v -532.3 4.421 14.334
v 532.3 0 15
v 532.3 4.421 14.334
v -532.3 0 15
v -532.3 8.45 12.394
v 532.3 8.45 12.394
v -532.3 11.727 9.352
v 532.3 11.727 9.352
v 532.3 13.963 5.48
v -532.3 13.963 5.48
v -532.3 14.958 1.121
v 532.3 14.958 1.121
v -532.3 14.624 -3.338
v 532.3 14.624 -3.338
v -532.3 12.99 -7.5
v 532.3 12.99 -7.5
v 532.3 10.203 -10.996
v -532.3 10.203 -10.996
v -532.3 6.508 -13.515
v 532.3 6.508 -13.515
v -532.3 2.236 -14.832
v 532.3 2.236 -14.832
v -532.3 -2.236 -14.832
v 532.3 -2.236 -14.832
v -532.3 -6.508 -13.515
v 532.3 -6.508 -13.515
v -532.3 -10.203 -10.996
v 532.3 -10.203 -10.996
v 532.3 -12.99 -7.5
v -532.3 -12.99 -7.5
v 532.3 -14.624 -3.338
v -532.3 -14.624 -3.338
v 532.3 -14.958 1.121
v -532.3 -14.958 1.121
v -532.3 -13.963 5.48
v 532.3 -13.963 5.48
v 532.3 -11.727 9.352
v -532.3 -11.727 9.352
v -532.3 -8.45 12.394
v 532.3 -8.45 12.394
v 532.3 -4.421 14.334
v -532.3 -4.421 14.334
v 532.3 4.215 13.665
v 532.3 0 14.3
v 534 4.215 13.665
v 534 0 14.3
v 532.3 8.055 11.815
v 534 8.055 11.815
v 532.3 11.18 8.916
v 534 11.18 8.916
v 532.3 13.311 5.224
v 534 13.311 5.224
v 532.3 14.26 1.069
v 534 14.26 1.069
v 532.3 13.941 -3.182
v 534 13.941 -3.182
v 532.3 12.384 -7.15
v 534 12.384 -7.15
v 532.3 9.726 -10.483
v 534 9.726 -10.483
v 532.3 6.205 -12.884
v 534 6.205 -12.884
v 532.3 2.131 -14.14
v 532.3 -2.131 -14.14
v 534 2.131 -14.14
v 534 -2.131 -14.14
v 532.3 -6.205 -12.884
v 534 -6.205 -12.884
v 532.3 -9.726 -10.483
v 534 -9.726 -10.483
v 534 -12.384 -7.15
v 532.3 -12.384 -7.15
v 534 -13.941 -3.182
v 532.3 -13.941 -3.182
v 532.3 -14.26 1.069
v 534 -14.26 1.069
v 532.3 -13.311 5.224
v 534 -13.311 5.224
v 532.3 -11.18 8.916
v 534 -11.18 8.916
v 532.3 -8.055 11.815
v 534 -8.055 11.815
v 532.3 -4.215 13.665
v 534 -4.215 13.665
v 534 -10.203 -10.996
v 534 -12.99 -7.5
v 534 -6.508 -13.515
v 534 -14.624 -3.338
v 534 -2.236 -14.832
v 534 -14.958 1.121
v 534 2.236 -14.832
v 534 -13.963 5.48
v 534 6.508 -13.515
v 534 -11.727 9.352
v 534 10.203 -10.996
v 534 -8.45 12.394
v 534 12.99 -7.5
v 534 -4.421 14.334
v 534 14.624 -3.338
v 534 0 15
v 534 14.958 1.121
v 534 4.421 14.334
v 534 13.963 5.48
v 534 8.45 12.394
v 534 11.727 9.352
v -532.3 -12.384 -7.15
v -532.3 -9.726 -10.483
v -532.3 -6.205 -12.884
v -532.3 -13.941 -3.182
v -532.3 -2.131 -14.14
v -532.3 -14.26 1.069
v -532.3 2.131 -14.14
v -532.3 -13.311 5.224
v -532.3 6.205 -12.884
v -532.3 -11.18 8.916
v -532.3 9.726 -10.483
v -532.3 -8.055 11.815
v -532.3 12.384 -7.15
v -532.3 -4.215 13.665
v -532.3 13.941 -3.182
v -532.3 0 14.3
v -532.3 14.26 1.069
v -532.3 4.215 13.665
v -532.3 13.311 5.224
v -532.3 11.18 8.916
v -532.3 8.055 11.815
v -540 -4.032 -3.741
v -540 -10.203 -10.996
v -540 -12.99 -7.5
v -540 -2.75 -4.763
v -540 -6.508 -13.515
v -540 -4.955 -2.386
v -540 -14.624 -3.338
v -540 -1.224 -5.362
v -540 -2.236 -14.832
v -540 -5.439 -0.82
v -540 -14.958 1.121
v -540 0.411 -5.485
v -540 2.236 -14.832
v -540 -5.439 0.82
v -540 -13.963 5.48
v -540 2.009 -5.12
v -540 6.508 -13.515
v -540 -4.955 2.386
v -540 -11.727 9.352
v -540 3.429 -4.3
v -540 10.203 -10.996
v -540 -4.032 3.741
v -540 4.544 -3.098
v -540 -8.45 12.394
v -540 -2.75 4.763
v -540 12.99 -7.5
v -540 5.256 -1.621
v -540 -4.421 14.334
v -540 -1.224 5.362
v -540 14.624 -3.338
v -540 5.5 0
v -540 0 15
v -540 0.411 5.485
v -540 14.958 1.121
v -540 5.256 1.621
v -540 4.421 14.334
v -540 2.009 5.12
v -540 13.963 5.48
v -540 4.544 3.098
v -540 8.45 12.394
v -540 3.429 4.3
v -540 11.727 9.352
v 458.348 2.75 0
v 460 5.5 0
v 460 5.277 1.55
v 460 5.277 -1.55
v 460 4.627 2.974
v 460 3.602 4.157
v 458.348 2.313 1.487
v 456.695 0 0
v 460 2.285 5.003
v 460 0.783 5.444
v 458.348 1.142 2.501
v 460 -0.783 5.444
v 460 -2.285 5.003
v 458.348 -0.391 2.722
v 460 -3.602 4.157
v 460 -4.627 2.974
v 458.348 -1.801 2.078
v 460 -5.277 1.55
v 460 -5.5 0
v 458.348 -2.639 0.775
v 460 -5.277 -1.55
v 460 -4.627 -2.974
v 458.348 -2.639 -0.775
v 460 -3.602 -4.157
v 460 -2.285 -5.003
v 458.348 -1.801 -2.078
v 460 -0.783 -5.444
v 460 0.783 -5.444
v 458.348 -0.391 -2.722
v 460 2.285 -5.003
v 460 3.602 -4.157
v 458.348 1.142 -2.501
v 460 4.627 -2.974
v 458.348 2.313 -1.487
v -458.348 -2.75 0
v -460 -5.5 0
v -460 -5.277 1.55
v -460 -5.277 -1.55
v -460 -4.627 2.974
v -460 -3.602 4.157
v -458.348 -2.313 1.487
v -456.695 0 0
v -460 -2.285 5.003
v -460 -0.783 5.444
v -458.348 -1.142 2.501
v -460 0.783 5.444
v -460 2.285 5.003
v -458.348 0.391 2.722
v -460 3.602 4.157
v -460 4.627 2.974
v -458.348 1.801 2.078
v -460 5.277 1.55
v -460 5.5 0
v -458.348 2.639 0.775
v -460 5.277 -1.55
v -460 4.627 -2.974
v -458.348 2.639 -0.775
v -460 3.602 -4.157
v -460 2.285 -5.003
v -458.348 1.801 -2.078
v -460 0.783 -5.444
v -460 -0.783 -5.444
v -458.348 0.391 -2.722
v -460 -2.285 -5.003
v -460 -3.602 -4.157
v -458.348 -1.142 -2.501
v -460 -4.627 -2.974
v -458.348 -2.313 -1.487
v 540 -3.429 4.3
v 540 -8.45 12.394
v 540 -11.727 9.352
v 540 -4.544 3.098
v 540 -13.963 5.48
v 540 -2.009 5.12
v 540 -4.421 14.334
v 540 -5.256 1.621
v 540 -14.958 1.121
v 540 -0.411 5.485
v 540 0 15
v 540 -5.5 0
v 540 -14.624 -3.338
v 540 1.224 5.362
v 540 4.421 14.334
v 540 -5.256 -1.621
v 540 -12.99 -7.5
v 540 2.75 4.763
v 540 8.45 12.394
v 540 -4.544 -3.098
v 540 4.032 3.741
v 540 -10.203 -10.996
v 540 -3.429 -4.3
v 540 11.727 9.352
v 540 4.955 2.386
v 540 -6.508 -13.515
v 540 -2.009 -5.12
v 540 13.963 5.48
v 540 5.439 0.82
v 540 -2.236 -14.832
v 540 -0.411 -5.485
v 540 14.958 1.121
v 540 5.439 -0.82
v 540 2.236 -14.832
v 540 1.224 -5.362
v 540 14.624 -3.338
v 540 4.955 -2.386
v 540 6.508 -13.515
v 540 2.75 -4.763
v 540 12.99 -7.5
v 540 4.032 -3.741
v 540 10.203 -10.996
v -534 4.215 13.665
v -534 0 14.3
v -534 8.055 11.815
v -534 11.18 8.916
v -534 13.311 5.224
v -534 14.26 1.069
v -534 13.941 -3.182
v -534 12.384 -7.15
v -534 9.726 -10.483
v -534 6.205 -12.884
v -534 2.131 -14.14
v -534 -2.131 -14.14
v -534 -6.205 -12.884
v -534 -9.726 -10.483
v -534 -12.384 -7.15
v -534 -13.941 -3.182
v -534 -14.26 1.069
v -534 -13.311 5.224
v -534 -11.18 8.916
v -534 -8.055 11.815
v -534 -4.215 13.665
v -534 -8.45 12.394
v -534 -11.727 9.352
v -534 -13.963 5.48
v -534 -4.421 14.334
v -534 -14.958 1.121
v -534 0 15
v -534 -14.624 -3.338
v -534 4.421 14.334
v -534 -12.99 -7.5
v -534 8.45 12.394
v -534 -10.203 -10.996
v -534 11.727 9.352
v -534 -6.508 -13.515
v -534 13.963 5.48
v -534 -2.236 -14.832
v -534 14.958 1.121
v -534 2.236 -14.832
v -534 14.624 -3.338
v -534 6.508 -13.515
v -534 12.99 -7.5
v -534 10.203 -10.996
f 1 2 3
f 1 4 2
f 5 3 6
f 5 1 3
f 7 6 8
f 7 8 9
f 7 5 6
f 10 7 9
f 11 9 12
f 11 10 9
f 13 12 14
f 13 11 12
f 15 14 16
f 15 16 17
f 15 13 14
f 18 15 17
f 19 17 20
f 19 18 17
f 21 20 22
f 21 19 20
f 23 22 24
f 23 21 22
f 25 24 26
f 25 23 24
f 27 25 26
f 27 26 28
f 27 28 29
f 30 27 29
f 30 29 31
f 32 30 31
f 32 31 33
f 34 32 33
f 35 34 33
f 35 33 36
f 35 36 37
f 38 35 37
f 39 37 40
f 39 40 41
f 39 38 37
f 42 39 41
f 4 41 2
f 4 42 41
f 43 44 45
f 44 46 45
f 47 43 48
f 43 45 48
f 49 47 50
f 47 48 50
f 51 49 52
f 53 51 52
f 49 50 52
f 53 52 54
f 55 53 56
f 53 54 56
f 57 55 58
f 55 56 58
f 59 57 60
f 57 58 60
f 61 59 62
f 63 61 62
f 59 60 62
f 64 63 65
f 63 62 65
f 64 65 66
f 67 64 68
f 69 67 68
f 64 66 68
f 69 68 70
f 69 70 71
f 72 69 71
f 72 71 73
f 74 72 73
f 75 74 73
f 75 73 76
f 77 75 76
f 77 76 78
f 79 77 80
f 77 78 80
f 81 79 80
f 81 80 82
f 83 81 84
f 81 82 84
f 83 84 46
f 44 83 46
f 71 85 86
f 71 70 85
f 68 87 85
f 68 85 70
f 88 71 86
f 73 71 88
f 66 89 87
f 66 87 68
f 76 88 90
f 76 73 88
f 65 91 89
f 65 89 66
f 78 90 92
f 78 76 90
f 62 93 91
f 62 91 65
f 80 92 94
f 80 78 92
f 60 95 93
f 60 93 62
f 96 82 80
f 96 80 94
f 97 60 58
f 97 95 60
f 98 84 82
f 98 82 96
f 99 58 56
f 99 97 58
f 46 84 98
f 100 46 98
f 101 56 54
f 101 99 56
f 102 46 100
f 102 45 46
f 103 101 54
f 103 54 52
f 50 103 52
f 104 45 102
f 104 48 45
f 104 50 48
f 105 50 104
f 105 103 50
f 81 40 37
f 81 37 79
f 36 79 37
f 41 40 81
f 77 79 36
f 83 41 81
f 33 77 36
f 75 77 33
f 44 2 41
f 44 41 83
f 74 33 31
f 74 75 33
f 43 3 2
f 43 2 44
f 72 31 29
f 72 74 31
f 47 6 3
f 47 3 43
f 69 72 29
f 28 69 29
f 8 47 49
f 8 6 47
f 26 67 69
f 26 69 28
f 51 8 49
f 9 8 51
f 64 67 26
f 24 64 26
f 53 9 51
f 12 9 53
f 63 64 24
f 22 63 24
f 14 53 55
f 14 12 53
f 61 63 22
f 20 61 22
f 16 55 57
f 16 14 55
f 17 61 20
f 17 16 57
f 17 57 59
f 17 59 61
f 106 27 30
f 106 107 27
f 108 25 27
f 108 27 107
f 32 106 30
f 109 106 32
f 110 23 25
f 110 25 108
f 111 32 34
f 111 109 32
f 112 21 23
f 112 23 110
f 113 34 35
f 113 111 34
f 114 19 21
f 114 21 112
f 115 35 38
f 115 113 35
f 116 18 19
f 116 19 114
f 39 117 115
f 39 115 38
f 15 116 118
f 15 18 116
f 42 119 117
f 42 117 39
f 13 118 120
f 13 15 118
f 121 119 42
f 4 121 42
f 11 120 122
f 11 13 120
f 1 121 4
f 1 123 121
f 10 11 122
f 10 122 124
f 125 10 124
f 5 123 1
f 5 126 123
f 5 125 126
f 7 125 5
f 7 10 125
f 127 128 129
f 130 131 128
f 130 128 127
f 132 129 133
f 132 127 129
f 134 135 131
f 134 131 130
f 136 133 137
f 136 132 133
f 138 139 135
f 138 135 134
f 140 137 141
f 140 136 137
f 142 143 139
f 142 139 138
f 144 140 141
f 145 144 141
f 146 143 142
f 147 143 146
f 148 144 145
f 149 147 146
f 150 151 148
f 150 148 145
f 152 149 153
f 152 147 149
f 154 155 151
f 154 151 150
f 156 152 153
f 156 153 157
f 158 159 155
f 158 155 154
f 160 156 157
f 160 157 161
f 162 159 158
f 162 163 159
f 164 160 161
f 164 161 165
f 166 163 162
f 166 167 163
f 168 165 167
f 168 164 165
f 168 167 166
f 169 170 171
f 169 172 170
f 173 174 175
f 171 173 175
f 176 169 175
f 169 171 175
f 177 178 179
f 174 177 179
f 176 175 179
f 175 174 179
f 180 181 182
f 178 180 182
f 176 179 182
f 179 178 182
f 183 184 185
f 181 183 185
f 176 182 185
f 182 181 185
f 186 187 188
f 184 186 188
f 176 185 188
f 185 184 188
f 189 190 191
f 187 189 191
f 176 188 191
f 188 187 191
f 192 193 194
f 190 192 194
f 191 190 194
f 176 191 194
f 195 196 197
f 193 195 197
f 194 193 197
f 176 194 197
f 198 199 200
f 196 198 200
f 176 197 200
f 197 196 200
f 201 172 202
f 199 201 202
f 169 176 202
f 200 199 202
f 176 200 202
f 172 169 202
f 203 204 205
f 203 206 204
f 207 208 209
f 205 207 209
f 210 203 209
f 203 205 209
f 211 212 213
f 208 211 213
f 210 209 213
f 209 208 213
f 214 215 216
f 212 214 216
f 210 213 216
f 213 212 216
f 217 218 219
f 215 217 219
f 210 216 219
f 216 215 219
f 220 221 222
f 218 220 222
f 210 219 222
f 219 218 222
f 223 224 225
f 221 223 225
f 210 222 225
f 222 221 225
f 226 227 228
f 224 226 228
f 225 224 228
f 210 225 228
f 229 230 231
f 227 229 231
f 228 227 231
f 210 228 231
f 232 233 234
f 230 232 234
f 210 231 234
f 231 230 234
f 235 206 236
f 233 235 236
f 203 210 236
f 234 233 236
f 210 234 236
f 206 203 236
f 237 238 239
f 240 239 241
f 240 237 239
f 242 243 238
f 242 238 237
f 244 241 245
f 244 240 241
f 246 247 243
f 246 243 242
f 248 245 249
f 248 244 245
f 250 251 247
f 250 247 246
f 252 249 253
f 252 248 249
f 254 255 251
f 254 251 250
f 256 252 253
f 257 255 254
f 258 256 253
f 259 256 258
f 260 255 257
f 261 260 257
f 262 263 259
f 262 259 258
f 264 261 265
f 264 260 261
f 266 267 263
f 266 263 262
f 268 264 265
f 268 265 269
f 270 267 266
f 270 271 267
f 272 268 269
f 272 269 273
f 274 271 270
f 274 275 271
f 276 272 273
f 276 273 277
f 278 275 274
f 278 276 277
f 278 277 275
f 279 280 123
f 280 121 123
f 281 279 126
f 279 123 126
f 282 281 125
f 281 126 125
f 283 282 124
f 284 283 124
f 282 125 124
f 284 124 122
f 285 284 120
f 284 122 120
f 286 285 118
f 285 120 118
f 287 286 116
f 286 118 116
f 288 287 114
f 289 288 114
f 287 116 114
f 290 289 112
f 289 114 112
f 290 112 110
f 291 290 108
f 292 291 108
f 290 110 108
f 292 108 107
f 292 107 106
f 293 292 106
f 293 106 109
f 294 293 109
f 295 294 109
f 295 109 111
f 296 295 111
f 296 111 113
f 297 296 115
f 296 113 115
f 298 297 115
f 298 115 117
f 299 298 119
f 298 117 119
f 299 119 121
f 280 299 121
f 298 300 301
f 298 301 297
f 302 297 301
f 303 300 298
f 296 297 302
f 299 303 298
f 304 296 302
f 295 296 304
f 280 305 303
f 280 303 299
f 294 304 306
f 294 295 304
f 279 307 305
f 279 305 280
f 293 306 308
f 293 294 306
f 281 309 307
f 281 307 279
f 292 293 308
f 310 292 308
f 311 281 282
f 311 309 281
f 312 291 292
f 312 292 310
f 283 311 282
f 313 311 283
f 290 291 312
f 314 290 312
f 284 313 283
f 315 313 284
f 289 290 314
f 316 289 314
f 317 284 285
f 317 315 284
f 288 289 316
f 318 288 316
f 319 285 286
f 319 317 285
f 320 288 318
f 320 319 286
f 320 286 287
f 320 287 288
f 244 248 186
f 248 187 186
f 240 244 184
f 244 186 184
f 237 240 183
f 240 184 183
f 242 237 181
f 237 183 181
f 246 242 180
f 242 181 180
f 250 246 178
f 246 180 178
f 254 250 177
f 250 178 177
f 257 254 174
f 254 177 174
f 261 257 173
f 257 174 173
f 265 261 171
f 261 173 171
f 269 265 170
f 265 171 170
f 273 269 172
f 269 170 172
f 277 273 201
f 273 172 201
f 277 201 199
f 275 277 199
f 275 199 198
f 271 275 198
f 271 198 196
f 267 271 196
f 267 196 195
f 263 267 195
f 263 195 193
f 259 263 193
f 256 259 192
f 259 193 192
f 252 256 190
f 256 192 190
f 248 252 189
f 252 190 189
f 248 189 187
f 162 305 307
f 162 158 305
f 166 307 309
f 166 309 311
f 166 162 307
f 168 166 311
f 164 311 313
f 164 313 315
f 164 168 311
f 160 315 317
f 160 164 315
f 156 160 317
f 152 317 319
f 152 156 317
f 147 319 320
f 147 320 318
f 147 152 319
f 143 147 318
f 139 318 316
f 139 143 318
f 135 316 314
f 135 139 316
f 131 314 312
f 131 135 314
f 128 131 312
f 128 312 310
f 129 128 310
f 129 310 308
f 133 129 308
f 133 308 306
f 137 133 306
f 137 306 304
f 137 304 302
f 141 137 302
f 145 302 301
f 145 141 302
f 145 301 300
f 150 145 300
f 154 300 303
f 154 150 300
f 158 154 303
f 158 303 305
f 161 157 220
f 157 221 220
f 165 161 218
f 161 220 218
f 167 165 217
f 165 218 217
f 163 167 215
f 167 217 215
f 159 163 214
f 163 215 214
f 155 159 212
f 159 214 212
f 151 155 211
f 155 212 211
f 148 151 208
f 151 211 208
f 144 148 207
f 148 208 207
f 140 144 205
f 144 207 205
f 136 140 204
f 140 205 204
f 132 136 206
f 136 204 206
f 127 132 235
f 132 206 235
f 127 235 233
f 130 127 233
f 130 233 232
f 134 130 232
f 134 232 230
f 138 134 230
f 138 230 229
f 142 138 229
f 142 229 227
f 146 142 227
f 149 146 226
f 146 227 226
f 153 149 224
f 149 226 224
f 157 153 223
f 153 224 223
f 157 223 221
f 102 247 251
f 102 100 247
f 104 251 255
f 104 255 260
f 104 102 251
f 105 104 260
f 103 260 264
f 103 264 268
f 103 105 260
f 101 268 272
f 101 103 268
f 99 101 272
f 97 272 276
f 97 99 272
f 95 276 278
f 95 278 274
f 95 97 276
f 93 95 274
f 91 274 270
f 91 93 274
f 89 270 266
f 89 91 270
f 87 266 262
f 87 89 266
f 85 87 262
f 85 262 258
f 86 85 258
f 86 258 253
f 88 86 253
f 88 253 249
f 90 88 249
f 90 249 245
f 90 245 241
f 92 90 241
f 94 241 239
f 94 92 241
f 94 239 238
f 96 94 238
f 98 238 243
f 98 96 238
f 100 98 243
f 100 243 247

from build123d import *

# Parameters (mm, degrees)
F0_W     = 1.7
F0_H     = 14.3
F3_D     = 11
F3_DEPTH = 80
F3_TIP   = 3.3047334047
F5_D     = 11
F5_DEPTH = 80
F5_TIP   = 3.3047334047


with BuildPart() as f1:
    # F0 (on Front) → F1 (revolve)
    with BuildSketch(Plane.XZ):
        Polygon((534, 14.3), (534, 0), (540, 0), (540, 15), (534, 15), align=None)
        with Locations((533.15, 7.15)):
            Rectangle(F0_W, F0_H)
        Polygon((0, 15), (0, 0), (532.3, 0), (532.3, 14.3), (532.3, 15), align=None)
        Polygon((-532.3, 15), (-532.3, 14.3), (-532.3, 0), (0, 0), (0, 15), align=None)
        with Locations((-533.15, 7.15)):
            Rectangle(F0_W, F0_H)
        Polygon((-534, 15), (-540, 15), (-540, 0), (-534, 0), (-534, 14.3), align=None)
    revolve(axis=Axis((-281.0423572082, 0, 0), (-1, 0, 0)))

    # F3
    with Locations(Plane(origin=(-540, 0, 0), x_dir=(0, -1, 0), z_dir=(-1, 0, 0))):
        with Locations((0, 0)):
            Hole(F3_D / 2, depth=F3_DEPTH)
            with Locations((0, 0, -(F3_DEPTH + F3_TIP / 2))):  # 118° drill point
                Cone(0, F3_D / 2, F3_TIP, mode=Mode.SUBTRACT)

    # F5
    with Locations(Plane.YZ.offset(540)):
        with Locations((0, 0)):
            Hole(F5_D / 2, depth=F5_DEPTH)
            with Locations((0, 0, -(F5_DEPTH + F5_TIP / 2))):  # 118° drill point
                Cone(0, F5_D / 2, F5_TIP, mode=Mode.SUBTRACT)


solid = f1.part
